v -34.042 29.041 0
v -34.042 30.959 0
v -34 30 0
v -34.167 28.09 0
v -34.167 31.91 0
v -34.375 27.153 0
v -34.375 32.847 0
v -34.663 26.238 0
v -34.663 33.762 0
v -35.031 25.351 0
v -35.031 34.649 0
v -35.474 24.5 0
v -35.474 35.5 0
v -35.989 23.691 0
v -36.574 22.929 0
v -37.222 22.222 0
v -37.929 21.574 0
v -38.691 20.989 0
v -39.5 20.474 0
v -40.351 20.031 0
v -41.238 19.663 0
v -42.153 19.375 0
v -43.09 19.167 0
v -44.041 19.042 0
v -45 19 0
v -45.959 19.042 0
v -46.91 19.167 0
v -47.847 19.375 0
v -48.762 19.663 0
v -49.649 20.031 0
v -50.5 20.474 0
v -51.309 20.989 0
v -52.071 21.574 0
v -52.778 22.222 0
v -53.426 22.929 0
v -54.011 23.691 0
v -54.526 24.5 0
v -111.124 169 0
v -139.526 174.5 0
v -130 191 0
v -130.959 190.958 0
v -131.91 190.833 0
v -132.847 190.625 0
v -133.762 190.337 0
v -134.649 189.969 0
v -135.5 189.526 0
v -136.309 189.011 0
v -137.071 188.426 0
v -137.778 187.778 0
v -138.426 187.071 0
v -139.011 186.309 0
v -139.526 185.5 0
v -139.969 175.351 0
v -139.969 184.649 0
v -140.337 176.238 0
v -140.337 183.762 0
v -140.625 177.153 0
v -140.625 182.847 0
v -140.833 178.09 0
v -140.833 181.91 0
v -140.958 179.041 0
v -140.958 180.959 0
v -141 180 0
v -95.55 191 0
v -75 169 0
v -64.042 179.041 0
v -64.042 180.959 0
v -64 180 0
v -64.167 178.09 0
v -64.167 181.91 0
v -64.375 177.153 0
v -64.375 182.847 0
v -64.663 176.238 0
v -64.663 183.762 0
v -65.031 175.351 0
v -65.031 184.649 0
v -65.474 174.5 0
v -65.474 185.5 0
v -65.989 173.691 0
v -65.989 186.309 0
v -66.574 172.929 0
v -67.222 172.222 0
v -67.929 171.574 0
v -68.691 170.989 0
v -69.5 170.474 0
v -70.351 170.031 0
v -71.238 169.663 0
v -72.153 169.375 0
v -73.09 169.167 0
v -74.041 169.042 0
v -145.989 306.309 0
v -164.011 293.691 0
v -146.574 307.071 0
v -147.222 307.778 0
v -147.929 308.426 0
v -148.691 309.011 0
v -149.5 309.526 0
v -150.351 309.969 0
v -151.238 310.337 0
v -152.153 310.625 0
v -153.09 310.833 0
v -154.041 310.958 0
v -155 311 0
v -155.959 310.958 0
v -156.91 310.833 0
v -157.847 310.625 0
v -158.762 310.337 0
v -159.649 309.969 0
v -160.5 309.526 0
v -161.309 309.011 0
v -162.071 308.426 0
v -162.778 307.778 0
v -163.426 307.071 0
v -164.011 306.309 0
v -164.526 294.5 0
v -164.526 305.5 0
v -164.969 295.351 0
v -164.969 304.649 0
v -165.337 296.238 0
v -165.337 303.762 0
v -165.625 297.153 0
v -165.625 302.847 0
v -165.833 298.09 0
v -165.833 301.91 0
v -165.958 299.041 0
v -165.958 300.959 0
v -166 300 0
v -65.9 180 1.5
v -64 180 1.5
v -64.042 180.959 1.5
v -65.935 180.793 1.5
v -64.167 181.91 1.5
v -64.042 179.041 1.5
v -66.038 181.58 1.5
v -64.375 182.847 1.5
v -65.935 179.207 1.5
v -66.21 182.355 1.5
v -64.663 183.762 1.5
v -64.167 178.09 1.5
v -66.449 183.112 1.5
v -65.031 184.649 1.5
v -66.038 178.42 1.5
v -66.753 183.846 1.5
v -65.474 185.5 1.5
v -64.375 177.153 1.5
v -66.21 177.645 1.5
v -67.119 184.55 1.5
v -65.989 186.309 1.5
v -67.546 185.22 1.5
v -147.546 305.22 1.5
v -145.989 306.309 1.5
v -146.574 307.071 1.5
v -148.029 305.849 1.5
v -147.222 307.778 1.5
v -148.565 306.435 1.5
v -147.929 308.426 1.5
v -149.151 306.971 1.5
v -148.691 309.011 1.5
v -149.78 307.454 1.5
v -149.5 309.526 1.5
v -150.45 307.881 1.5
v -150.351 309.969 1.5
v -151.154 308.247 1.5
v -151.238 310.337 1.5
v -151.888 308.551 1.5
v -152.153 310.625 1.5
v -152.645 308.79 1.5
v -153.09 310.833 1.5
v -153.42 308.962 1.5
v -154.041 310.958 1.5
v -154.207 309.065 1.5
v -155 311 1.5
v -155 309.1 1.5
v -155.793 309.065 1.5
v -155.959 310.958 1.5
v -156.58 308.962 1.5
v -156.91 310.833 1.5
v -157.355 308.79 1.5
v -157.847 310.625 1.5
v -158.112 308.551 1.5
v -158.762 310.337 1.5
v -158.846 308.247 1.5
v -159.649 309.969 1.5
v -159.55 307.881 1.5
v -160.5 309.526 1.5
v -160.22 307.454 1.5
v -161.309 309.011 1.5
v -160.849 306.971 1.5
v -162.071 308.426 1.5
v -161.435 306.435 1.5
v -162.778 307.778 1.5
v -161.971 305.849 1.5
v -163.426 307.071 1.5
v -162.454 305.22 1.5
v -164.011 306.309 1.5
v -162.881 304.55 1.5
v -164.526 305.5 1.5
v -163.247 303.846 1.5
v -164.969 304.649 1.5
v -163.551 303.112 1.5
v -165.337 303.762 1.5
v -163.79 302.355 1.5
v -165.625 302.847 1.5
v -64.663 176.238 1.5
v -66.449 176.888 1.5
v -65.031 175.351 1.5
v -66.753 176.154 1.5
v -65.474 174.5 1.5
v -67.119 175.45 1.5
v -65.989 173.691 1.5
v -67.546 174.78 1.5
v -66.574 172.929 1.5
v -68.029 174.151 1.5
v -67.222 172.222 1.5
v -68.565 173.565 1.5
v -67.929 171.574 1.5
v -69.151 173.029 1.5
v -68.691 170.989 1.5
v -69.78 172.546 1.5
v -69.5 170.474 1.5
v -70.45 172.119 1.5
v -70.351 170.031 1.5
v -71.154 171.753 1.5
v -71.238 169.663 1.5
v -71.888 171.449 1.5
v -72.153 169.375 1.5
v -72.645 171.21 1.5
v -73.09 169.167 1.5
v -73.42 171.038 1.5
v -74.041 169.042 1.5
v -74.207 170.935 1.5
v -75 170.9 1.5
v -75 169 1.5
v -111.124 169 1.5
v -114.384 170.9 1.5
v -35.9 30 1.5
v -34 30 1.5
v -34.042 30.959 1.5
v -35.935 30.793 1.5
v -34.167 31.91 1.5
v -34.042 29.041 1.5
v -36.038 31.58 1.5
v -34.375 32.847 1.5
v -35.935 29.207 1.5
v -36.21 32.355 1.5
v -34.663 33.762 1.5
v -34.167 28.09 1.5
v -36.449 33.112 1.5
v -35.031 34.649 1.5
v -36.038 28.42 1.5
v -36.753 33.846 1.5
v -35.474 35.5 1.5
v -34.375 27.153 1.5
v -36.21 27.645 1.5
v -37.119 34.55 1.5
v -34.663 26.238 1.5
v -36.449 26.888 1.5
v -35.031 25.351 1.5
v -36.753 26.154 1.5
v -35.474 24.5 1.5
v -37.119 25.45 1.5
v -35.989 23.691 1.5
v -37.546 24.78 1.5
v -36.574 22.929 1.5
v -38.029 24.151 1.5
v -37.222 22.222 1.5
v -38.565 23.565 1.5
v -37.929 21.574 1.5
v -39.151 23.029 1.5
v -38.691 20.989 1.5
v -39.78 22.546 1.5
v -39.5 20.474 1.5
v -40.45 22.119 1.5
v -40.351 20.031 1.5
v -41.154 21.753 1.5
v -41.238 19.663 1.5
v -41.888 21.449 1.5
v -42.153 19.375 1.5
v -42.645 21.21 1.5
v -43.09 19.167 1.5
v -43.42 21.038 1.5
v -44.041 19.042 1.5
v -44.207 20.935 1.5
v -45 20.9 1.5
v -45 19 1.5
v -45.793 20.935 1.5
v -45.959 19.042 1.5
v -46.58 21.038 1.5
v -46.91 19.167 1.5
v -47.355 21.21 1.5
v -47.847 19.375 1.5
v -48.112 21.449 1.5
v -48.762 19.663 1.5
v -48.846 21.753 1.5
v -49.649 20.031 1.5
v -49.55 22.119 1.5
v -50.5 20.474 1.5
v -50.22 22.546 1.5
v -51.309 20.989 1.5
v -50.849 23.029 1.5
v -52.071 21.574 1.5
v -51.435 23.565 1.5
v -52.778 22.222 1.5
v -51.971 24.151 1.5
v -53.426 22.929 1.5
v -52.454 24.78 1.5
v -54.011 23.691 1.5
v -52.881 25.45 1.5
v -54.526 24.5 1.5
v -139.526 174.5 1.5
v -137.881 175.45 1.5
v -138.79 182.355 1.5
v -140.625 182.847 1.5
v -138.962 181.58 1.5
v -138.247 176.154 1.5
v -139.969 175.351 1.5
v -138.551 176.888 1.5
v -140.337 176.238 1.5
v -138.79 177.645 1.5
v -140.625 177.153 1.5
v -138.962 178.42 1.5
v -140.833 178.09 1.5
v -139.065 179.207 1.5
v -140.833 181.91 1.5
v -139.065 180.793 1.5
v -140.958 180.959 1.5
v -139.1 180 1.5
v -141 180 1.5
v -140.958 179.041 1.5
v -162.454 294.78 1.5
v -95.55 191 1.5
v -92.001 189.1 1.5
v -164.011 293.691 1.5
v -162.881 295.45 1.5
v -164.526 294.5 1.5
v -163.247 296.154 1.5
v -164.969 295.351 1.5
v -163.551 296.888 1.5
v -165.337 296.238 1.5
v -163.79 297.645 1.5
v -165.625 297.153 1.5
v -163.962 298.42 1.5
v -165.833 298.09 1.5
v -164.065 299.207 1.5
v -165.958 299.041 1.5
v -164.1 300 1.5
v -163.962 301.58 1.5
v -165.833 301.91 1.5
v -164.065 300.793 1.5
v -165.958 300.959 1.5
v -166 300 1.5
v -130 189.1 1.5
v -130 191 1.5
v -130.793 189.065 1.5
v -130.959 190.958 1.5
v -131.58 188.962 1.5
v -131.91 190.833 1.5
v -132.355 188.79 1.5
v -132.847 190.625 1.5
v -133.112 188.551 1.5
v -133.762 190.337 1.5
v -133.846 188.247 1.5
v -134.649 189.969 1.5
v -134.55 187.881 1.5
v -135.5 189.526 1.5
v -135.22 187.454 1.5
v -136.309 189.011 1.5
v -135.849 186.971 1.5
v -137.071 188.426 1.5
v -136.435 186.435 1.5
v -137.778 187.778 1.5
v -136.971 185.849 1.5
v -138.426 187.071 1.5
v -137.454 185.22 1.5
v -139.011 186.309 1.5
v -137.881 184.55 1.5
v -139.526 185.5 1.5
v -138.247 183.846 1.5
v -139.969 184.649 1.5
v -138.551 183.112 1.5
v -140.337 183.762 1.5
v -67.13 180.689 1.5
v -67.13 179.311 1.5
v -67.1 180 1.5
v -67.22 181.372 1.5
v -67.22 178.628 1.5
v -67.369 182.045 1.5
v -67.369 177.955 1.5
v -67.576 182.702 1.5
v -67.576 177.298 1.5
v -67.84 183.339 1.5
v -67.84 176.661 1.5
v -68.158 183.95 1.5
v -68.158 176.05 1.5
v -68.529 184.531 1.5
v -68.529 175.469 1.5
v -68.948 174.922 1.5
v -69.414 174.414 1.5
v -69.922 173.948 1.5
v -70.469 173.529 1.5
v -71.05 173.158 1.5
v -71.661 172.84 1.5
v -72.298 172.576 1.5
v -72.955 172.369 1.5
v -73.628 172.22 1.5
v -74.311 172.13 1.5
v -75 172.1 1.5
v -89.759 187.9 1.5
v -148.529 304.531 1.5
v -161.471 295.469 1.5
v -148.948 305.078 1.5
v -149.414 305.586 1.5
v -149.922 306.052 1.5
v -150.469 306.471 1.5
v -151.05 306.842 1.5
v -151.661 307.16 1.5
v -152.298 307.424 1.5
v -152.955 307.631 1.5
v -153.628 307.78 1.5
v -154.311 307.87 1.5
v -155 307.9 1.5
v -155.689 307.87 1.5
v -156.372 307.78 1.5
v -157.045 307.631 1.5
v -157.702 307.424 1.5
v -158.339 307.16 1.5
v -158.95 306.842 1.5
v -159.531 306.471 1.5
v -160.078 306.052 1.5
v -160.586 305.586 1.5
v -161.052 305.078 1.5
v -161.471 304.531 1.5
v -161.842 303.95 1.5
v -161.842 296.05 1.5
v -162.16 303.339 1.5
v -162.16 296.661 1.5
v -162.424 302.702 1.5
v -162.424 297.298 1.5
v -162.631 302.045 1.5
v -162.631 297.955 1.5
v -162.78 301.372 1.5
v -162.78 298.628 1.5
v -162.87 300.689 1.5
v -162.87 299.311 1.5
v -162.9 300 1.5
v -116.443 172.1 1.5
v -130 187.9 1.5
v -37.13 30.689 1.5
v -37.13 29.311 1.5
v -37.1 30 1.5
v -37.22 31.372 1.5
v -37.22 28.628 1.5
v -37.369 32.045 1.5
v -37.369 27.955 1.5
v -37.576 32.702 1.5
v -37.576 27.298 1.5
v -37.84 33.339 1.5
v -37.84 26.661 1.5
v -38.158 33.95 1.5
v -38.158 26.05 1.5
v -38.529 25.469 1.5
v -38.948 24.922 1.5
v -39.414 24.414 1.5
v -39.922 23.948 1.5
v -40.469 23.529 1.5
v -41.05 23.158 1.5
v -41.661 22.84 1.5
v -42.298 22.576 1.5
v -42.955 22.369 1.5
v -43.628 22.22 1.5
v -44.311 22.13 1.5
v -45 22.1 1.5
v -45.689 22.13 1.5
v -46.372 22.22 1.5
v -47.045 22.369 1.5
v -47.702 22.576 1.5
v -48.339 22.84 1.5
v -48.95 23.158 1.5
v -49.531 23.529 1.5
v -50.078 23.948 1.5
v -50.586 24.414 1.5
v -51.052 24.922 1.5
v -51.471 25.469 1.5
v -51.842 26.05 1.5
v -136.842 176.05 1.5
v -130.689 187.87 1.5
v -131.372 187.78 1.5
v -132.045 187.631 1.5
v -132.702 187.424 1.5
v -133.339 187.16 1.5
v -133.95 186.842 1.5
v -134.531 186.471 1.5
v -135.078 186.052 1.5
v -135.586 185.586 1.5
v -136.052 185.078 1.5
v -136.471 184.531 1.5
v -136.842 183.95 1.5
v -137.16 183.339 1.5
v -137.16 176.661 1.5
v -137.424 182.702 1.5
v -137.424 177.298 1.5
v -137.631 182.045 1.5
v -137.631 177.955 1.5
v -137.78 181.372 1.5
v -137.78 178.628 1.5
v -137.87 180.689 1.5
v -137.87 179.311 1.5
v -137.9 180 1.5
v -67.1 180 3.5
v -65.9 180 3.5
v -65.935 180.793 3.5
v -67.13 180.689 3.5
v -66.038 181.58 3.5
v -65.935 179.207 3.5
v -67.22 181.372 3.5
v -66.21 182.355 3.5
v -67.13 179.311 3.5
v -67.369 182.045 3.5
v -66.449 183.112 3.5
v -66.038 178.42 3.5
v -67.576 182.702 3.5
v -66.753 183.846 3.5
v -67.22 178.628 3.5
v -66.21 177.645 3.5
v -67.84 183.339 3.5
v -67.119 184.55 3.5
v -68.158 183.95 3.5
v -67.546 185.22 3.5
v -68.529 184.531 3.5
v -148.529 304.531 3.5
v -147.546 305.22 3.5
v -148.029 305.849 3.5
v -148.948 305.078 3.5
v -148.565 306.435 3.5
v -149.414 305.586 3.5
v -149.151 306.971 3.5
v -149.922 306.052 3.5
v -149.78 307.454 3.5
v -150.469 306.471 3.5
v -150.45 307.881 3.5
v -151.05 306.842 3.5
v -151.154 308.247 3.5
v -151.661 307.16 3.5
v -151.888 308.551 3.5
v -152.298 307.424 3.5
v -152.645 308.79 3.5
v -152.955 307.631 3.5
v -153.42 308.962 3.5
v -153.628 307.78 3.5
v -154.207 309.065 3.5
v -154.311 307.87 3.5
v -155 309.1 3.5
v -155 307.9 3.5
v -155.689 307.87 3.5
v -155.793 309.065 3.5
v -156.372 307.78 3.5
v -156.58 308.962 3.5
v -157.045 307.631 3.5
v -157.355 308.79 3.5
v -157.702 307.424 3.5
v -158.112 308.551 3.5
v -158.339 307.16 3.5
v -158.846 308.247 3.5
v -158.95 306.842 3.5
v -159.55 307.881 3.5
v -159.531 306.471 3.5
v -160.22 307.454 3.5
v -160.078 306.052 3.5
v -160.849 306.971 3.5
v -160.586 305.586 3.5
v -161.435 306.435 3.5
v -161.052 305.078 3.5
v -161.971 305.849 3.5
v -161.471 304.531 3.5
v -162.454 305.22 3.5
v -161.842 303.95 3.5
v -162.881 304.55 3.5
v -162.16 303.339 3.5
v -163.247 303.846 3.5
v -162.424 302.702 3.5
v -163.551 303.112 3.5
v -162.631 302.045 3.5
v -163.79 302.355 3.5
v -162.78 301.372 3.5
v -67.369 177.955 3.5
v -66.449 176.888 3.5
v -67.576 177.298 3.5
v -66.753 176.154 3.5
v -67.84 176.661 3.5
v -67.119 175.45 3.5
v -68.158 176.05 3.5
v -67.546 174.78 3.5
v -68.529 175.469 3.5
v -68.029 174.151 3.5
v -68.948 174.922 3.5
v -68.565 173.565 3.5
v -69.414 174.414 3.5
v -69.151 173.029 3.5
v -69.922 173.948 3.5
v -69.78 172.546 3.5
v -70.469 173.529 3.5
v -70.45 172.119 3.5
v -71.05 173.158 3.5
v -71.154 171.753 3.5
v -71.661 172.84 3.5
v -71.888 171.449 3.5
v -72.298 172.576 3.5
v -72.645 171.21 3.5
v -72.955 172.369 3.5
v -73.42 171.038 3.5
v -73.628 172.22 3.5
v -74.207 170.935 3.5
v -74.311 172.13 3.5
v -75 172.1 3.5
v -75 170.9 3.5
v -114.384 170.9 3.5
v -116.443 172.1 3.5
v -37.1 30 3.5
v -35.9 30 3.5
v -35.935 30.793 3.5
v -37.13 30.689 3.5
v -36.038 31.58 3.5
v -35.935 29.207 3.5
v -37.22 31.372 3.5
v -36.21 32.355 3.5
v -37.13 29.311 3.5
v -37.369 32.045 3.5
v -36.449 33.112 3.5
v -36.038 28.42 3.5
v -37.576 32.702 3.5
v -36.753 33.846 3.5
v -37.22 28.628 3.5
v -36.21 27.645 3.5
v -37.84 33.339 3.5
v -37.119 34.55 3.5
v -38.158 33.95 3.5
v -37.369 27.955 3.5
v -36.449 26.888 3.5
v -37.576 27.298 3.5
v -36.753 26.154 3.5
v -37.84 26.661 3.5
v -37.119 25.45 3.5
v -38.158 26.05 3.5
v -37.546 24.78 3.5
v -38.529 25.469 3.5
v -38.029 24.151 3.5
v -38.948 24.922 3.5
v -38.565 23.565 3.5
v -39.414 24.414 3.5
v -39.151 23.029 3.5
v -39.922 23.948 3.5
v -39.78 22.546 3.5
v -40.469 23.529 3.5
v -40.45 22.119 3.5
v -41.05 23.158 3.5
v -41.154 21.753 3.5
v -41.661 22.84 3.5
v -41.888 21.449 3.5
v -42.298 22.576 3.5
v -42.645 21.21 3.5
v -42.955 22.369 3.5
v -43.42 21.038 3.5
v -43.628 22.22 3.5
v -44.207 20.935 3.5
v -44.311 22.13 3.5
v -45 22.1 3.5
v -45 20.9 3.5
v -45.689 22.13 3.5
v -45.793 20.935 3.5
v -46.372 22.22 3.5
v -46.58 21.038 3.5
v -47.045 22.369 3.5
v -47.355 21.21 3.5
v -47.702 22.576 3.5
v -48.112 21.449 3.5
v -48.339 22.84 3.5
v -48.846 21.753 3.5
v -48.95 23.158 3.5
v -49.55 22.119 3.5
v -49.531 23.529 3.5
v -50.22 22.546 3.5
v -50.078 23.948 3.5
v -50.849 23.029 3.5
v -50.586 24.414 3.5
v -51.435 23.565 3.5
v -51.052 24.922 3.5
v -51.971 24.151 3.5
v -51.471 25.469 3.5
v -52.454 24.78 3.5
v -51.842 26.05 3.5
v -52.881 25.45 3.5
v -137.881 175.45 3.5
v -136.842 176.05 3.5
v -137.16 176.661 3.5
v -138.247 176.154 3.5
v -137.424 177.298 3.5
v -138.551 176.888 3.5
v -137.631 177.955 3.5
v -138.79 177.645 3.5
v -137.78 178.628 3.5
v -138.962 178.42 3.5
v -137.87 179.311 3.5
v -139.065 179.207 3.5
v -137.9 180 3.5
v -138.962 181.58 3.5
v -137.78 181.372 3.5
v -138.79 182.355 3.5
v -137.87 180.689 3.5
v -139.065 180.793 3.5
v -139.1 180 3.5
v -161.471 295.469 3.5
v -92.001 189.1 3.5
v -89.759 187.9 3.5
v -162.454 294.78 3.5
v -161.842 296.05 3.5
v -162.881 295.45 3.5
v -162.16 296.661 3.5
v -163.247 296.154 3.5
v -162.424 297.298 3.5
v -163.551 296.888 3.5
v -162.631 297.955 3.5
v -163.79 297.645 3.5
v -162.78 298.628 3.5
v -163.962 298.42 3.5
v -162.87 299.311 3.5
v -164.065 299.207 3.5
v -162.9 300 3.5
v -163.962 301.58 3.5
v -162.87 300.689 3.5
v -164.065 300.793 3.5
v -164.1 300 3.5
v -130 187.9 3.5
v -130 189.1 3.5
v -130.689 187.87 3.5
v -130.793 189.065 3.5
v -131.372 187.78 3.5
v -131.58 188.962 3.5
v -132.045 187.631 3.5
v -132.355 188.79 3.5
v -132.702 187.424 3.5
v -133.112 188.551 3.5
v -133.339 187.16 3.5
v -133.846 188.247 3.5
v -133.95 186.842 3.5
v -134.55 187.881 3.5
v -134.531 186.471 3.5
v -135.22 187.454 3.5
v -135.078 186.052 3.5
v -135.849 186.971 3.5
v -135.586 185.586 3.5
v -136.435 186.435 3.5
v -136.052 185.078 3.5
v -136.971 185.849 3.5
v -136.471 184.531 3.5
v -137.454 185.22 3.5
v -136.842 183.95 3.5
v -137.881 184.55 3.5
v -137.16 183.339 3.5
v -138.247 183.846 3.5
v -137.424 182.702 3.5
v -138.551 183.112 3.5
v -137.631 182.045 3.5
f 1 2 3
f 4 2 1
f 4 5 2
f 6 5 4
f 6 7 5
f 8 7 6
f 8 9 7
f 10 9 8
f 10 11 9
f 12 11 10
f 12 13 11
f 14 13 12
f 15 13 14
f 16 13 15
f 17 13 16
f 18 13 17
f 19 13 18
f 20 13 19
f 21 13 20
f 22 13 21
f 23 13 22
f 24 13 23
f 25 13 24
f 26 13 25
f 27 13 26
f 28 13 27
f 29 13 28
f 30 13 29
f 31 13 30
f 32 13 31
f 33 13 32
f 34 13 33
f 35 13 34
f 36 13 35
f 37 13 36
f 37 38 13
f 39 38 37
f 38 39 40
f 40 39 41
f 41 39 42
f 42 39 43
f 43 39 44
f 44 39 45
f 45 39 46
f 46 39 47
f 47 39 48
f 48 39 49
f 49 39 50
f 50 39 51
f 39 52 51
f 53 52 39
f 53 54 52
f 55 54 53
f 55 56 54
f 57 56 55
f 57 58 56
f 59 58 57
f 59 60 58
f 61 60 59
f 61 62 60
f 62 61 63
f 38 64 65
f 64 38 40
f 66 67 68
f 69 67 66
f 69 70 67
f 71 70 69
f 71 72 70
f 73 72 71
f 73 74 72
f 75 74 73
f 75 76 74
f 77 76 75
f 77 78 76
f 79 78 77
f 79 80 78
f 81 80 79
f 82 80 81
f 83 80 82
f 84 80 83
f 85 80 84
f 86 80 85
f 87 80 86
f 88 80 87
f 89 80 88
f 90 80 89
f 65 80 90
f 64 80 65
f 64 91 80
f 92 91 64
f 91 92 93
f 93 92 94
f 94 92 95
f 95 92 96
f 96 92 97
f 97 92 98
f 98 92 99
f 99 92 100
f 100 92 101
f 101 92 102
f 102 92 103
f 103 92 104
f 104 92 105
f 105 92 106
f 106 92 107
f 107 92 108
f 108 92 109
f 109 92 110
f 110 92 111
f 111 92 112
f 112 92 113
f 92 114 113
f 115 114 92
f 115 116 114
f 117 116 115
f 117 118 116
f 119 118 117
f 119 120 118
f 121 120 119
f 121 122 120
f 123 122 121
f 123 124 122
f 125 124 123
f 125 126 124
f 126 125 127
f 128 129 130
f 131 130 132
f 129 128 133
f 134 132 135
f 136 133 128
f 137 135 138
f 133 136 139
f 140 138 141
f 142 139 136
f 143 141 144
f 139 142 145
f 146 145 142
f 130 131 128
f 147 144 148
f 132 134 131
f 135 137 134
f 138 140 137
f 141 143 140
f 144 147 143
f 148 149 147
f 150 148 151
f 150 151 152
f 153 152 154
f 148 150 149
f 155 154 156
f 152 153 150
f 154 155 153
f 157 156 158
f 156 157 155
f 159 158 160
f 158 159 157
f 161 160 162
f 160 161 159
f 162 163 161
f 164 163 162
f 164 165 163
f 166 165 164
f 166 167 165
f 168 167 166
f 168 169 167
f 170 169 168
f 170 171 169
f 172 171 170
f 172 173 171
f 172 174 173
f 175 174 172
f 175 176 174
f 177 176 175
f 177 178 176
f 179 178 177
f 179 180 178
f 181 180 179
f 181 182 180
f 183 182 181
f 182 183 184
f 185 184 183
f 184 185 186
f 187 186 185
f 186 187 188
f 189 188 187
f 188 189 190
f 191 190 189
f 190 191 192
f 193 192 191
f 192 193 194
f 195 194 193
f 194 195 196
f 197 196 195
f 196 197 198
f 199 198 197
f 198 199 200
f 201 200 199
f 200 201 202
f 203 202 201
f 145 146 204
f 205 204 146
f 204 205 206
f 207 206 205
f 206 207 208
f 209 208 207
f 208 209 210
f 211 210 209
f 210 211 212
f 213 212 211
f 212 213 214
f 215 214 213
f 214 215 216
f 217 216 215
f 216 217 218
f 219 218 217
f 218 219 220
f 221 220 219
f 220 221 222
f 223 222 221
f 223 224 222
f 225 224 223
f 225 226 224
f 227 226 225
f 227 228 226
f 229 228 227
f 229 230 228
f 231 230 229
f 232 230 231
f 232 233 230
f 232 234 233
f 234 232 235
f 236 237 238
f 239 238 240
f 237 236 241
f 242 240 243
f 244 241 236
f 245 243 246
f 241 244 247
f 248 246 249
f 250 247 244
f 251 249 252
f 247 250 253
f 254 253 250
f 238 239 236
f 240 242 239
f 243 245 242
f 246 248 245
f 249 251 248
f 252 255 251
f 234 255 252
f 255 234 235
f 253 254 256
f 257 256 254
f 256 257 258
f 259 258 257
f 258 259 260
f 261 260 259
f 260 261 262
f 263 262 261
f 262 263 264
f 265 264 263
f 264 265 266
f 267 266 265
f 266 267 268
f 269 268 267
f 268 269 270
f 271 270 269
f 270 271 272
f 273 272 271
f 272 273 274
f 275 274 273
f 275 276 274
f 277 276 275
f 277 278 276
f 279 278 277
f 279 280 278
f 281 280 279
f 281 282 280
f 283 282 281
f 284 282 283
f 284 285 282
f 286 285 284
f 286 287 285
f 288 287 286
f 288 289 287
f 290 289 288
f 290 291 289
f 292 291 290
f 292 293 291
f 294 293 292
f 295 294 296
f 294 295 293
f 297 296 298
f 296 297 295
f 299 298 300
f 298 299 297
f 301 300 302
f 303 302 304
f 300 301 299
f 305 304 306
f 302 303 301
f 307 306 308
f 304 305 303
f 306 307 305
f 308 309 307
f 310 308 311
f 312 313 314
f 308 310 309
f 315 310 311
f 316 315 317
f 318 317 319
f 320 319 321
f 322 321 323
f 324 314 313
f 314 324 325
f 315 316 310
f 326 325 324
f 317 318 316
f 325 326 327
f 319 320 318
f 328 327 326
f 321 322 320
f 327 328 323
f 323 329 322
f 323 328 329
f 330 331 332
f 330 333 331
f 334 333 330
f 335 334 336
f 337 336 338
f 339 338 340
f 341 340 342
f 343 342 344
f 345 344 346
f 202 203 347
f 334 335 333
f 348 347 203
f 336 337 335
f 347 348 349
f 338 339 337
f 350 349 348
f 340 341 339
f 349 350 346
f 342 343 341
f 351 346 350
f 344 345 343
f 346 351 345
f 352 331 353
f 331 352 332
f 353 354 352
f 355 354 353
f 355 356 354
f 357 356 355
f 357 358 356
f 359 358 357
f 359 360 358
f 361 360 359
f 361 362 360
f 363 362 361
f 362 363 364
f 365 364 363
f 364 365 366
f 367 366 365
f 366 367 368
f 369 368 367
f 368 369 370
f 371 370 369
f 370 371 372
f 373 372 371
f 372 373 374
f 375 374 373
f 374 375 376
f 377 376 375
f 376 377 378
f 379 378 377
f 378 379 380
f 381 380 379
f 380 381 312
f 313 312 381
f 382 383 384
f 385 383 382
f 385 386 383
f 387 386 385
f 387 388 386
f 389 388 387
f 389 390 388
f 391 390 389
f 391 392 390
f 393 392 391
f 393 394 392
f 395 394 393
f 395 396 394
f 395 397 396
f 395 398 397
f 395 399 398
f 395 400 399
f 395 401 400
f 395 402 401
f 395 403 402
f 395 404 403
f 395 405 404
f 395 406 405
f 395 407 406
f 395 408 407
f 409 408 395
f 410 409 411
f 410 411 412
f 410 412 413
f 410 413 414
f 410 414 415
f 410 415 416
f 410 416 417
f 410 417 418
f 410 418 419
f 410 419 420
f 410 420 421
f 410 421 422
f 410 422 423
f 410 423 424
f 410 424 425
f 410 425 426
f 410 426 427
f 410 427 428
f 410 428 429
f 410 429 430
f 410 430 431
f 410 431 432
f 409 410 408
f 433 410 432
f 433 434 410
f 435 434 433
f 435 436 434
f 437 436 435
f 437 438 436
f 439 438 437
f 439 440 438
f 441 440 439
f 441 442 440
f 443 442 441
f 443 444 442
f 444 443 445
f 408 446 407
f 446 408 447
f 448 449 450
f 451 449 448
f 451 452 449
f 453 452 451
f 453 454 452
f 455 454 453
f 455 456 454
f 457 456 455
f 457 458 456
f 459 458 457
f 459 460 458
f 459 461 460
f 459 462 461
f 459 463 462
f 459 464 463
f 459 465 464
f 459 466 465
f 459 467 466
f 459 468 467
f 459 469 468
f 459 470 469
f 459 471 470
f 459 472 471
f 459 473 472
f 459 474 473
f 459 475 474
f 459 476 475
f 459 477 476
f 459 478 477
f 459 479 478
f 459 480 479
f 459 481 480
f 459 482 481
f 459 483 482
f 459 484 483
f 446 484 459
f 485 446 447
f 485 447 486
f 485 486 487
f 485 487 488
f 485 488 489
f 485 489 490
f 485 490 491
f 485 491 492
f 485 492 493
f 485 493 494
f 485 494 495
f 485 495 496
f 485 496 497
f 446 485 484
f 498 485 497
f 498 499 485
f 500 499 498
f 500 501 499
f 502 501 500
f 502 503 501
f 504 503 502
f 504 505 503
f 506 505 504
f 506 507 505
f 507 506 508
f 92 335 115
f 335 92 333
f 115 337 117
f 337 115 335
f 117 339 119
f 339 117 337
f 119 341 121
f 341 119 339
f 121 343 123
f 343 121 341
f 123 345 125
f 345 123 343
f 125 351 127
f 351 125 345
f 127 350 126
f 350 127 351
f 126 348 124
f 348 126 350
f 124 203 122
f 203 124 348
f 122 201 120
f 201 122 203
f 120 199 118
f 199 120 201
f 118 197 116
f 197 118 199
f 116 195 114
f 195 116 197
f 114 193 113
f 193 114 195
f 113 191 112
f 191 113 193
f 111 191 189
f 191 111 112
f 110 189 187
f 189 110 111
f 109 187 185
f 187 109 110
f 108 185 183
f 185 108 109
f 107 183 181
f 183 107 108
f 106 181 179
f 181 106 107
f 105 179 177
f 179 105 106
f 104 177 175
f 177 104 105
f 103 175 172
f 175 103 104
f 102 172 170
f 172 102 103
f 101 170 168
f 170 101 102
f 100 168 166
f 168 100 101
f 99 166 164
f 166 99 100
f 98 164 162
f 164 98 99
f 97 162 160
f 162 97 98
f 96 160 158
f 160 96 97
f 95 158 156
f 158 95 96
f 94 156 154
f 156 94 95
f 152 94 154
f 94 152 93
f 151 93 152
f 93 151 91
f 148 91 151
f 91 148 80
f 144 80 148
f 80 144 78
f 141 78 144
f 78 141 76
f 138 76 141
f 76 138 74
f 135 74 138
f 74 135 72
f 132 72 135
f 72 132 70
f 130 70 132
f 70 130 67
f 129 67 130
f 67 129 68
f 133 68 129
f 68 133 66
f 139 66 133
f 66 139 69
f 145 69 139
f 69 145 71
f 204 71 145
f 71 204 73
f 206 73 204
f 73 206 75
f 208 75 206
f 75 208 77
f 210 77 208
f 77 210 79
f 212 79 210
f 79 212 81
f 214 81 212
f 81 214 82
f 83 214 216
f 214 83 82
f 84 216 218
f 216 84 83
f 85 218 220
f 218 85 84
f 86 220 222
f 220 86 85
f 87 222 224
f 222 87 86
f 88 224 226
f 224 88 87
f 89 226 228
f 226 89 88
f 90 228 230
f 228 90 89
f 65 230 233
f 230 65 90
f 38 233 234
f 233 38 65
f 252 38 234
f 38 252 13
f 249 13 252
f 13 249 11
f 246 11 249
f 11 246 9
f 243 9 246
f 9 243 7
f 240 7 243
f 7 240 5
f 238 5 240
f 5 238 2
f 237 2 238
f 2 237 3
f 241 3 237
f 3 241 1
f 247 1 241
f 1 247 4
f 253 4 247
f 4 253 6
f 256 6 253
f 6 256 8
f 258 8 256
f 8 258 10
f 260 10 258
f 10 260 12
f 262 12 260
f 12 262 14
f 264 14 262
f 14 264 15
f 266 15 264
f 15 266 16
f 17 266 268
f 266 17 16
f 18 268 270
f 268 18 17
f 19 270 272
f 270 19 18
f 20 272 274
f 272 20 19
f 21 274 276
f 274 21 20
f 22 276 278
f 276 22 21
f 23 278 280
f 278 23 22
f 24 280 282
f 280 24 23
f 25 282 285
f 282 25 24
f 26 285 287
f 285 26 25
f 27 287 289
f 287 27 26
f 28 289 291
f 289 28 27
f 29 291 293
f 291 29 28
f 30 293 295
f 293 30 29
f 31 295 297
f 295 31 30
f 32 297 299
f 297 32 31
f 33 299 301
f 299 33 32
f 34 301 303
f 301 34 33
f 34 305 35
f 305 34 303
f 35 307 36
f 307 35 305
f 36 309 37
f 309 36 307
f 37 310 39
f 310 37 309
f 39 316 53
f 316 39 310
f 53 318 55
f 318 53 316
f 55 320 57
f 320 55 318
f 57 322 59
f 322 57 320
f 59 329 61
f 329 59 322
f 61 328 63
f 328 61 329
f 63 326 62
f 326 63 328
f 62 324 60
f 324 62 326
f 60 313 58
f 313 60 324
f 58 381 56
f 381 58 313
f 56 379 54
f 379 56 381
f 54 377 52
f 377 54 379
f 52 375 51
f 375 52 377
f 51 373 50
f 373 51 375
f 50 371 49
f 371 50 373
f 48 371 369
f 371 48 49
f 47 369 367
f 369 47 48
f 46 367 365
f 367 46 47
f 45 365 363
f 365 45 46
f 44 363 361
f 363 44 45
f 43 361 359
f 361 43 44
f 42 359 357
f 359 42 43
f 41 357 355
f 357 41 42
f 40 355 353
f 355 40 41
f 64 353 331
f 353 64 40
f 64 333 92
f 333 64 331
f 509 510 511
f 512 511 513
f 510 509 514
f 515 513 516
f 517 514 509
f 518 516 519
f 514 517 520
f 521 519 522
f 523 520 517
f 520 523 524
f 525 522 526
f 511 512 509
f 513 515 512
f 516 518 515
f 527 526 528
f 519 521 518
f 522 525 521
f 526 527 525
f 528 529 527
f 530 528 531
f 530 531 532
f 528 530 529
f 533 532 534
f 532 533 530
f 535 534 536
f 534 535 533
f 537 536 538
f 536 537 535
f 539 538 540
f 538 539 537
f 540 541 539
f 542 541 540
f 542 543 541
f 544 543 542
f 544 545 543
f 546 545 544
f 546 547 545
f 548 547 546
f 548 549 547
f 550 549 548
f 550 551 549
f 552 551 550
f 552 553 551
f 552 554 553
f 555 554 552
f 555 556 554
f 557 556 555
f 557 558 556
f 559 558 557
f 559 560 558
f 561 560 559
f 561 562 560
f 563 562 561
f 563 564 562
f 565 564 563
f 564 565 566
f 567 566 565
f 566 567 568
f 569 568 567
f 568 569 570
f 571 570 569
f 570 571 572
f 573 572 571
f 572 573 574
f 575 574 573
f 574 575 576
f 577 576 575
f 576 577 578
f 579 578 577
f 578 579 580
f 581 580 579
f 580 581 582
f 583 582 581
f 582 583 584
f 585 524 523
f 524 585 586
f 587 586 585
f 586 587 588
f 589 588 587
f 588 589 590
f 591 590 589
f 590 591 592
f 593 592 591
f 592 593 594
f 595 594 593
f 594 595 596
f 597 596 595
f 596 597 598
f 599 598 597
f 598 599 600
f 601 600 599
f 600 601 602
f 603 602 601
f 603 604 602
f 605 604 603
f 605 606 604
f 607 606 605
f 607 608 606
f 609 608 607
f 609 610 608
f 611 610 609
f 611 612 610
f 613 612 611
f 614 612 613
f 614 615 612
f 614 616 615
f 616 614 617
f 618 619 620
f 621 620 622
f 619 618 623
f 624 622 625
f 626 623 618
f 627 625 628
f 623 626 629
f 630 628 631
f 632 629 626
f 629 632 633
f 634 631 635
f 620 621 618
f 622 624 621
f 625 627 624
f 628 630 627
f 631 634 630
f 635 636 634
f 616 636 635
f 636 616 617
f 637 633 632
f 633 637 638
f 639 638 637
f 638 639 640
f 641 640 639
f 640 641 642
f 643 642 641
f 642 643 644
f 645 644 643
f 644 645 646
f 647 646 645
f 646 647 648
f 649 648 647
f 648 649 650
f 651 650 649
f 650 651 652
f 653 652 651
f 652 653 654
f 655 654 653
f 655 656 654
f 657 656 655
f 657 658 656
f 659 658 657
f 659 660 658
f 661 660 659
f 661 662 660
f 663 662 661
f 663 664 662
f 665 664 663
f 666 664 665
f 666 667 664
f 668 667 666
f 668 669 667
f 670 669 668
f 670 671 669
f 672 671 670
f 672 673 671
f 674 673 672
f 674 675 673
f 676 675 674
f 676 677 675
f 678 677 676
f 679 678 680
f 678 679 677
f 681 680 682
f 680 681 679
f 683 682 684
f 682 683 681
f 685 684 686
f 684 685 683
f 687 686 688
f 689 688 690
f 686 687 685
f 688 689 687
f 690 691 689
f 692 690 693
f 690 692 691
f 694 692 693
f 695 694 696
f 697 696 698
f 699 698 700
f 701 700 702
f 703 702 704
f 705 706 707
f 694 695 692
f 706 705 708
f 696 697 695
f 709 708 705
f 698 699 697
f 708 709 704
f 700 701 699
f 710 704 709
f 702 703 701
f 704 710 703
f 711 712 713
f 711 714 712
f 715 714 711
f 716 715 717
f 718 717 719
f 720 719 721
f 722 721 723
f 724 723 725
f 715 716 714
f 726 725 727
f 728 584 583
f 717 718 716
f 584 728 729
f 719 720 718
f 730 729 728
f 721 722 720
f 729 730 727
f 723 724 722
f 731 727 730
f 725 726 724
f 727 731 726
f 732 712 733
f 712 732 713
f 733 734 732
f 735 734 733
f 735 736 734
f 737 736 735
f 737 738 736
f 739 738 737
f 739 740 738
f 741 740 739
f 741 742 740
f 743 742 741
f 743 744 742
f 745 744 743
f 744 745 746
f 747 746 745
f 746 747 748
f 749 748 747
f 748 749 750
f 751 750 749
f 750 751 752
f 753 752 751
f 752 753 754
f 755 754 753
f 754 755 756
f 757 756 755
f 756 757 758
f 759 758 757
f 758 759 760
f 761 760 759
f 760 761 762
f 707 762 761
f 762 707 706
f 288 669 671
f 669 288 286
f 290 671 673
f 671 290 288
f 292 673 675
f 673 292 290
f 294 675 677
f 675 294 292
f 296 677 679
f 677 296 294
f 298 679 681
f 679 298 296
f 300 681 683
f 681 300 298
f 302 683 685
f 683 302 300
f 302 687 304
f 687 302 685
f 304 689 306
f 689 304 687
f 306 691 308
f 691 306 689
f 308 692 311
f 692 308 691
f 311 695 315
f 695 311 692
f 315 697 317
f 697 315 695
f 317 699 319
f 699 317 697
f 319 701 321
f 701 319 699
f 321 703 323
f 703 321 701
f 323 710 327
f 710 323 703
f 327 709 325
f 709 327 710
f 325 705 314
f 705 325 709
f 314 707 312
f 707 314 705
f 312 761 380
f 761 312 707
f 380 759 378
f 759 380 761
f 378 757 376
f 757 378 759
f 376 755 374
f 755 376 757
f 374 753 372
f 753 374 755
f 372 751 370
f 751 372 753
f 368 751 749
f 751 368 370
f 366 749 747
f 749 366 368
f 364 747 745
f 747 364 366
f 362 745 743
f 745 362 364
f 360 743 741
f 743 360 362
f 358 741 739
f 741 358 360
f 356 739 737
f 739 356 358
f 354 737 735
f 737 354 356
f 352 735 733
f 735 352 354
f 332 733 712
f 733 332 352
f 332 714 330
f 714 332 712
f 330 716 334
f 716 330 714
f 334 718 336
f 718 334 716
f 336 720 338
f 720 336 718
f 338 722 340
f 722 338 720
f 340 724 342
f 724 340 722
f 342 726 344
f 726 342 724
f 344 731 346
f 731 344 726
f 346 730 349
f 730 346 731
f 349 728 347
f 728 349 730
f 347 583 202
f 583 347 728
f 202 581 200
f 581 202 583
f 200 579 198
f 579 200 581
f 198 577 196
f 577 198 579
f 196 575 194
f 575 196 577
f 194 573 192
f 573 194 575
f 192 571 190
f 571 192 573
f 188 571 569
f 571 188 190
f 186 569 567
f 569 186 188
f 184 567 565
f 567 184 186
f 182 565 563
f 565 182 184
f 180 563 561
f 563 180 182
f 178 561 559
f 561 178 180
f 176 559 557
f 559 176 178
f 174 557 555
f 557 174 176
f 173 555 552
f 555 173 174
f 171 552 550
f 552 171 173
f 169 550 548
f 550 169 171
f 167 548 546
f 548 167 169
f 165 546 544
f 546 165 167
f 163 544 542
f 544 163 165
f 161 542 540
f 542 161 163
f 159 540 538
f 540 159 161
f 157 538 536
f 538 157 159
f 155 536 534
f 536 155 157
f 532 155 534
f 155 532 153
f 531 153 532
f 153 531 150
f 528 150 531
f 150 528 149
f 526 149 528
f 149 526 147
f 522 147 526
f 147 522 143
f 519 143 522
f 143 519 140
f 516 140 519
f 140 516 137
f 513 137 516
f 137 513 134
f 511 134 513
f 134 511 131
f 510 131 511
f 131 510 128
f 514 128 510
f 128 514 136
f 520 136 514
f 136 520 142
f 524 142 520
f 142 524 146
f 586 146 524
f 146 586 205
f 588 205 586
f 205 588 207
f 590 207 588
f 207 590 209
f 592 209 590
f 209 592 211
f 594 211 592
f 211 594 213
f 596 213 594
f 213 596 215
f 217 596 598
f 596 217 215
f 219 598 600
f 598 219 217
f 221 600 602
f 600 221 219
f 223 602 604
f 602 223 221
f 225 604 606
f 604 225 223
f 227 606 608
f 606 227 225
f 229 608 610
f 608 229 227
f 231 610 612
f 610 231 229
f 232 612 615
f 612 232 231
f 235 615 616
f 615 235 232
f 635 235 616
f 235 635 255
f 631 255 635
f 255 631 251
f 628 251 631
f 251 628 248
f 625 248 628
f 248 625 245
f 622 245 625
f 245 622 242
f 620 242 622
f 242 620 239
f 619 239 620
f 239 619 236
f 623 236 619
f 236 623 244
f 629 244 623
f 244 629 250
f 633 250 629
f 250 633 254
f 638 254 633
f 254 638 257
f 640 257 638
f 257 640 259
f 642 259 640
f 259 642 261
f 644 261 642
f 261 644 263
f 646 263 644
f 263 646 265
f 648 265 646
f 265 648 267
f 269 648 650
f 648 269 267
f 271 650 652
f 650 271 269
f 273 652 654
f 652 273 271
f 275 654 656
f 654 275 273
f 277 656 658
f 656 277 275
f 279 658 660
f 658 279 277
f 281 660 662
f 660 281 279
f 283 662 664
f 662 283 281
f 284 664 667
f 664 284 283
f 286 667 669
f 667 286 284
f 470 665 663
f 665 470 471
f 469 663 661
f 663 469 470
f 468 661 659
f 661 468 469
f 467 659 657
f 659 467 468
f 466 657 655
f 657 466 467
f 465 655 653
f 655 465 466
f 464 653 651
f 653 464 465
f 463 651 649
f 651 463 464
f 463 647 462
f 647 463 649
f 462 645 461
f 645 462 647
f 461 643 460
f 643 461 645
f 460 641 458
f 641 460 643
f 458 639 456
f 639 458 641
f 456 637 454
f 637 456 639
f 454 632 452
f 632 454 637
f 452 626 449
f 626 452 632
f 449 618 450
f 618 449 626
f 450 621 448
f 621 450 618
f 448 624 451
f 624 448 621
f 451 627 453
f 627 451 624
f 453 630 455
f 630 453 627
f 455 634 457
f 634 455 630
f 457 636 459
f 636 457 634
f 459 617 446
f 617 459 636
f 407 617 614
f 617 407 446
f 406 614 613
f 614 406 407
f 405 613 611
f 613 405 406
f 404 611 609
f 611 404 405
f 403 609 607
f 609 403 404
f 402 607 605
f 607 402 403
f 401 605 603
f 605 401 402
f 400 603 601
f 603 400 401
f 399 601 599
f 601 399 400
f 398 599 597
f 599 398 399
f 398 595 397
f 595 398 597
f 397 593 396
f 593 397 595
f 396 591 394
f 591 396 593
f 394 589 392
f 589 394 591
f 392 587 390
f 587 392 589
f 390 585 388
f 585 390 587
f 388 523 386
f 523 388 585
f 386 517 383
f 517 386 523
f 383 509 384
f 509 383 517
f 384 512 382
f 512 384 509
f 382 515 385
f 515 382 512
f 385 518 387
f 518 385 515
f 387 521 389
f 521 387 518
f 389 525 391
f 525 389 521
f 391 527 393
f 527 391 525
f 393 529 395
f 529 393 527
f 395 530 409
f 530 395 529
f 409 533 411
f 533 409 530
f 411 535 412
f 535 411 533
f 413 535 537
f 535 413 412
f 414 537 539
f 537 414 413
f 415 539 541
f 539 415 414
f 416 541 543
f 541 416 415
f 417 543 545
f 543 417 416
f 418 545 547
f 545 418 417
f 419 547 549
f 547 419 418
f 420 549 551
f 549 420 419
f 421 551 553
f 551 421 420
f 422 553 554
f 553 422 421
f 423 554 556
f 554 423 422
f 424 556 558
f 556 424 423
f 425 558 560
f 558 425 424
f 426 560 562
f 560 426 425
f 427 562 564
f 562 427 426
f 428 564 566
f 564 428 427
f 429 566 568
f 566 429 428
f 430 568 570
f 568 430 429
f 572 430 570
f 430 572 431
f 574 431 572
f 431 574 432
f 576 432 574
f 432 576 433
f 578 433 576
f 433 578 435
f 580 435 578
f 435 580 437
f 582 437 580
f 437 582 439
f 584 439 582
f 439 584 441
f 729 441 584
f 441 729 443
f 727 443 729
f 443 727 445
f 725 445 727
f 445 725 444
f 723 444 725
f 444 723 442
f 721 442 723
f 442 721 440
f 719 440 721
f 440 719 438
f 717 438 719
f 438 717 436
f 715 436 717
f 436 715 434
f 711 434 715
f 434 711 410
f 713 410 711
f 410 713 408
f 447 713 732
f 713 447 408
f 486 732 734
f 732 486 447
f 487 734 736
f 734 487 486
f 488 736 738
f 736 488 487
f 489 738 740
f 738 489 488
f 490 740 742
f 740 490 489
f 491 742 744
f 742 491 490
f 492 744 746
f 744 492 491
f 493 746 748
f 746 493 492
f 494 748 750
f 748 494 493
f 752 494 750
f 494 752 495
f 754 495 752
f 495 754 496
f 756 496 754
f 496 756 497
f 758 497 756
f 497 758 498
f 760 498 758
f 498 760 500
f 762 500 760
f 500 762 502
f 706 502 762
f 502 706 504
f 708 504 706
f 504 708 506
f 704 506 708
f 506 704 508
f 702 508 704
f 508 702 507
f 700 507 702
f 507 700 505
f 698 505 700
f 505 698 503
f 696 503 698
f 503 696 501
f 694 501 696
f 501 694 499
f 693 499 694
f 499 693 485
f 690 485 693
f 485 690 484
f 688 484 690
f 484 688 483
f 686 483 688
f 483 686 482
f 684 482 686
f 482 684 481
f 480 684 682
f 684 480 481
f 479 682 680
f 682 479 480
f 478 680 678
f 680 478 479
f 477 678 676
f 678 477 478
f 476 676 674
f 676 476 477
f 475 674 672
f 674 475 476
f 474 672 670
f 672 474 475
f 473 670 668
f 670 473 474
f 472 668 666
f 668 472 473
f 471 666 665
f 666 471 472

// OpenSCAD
// file: ../collar.scad
// Calibrated press-fit collar, merged into the rear wall at each pixel.
// The STL is symmetric top/bottom (retention lip at mid-height), so insertion
// direction does not matter. Native STL sits X-centered at collar_cx, Z 0..collar_h.

module collar_solid() {
    translate([-collar_cx, 0, 0])
        import(collar_stl, convexity = 6);
}

module place_collar(x, y) {
    translate([x, y, 0]) collar_solid();
}
// file: ../config.scad
// ===== CHARGE LED sign — global config =====
// Edit this file; then run ./build.sh to regenerate every STL.

$fn = 72;

// ---- bullet pixel datasheet (measured + validated) ----
// dome Ø8, barrel Ø12, flange Ø13.6 x 2mm, dome-tip -> flange 5.5mm.
// Above the plate: ~Ø12 barrel for ~0.5mm, then the Ø8 dome to a tip ~dome_clear
// above the plate front. Drives pixel_through, dome_clear, and led_void clearances.

// ---- calibrated collar (press-fit for 12mm bullet pixel) ----
collar_stl    = "../../assets/bullet-collar.stl"; // path resolved from src/parts/ entry files
collar_h      = 2.0;     // Z span of the collar STL
collar_od     = 16.0;    // collar outer diameter
collar_cx     = 43.0;    // STL native X center (Y center is 0)
pixel_through = 12.3;    // clearance hole through the plate (just over bore Ø12.19)
dome_clear    = 4.0;     // dome protrusion above plate front. Spec: 5.5mm dome-tip-to-flange,
                         // flange seats on plate back, minus 2mm plate ~= 3.5-4mm. Seat a real
                         // pixel and measure to lock it in.

// ---- shell ----
plate_t    = 2.0;        // rear plate thickness (== collar_h, so the collar sits flush)
wall_t     = 2.5;        // chimney wall thickness
cell_inner = 30;         // square interior of each test cell (the press-fit opening)

// ---- diffuser panels (flat, drop-in — kept for the final glued option) ----
panel_press_clear = 0.25; // panel is this much SMALLER than the opening (total) -> friction fit
panel_thicks      = [1, 2, 3];

// ---- diffuser CAP (slides over an ISOLATED chimney; not used on touching rows) ----
cap_fit_clear = 0.4;   // skirt-inner minus chimney-outer (total); bigger = looser slide
cap_skirt_t   = 1.6;   // skirt wall thickness
cap_skirt_h   = 7;     // how far the skirt grips down over the chimney

// ---- diffuser LID = flanged plug (plug locates in the opening, flange catches on the rim) ----
lid_flange_cover = wall_t;  // flange overhang per side ~= wall width (rests on rim, can't fall in)
lid_flange_gap   = 0.3;     // shrink the flange a hair so neighbour lids don't clash
lid_plug_h       = 4;       // how far the plug drops into the opening (0 = plain flat tile)
lid_plug_clear   = 0.2;     // plug-outer = opening minus this (total) -> friction fit
                            // (was 0.5/loose; PETG plug in a PLA hole grips well at 0.2)
lid_plug_wall    = 1.5;     // plug-frame wall thickness

// ---- coupon depth ladder ----
led_gaps = [10, 15, 20]; // clear LED-tip -> diffuser distance, per cell (mm)
                         // (was [20,35,50] — 35/50 went too dim/washed; 20 is the new max)

// ---- collar v2: original bore + lip, plus a 45-deg lead-in chamfer ----
bore_face_r   = 6.10;    // collar bore radius at each face (~Ø12.2)
chamfer_depth = 0.5;     // axial depth of the 45-deg lead-in at each face
mouth_r       = bore_face_r + chamfer_depth;  // chamfer mouth radius (~Ø13.2)

// ---- collar A/B test harness ----
harness_w     = 52;      // tile width
harness_d     = 30;      // tile depth
harness_t     = plate_t; // match the real wall thickness for a faithful fit test
harness_pitch = 24;      // spacing between the two hole centers

// ---- derived ----
cell_pitch = cell_inner + 2 * wall_t;      // outer cell footprint (35)
n_cells    = len(led_gaps);
plate_w    = n_cells * cell_pitch;
plate_d    = cell_pitch;
panel_side = cell_inner - panel_press_clear;
function cell_x(i)     = i * cell_pitch + cell_pitch / 2;   // column center (distance)
function cell_y(j)     = j * cell_pitch + cell_pitch / 2;   // row center (for grid coupons)
function chimney_H(i)  = plate_t + dome_clear + led_gaps[i];
// main file
// Visual QA (NOT for print): white (opaque) + clear (translucent) for a variation.
// -D V=1 (white center stripe) or -D V=2 (white edges).
include <../config.scad>
include <../collar.scad>
include <../bolt.scad>
V = 1;
color("white")           { if (V==1) bolt_lens_v1_white(); else bolt_lens_v2_white(); }
color([0.55,0.8,1,0.35]) { if (V==1) bolt_lens_v1_clear(); else bolt_lens_v2_clear(); }
